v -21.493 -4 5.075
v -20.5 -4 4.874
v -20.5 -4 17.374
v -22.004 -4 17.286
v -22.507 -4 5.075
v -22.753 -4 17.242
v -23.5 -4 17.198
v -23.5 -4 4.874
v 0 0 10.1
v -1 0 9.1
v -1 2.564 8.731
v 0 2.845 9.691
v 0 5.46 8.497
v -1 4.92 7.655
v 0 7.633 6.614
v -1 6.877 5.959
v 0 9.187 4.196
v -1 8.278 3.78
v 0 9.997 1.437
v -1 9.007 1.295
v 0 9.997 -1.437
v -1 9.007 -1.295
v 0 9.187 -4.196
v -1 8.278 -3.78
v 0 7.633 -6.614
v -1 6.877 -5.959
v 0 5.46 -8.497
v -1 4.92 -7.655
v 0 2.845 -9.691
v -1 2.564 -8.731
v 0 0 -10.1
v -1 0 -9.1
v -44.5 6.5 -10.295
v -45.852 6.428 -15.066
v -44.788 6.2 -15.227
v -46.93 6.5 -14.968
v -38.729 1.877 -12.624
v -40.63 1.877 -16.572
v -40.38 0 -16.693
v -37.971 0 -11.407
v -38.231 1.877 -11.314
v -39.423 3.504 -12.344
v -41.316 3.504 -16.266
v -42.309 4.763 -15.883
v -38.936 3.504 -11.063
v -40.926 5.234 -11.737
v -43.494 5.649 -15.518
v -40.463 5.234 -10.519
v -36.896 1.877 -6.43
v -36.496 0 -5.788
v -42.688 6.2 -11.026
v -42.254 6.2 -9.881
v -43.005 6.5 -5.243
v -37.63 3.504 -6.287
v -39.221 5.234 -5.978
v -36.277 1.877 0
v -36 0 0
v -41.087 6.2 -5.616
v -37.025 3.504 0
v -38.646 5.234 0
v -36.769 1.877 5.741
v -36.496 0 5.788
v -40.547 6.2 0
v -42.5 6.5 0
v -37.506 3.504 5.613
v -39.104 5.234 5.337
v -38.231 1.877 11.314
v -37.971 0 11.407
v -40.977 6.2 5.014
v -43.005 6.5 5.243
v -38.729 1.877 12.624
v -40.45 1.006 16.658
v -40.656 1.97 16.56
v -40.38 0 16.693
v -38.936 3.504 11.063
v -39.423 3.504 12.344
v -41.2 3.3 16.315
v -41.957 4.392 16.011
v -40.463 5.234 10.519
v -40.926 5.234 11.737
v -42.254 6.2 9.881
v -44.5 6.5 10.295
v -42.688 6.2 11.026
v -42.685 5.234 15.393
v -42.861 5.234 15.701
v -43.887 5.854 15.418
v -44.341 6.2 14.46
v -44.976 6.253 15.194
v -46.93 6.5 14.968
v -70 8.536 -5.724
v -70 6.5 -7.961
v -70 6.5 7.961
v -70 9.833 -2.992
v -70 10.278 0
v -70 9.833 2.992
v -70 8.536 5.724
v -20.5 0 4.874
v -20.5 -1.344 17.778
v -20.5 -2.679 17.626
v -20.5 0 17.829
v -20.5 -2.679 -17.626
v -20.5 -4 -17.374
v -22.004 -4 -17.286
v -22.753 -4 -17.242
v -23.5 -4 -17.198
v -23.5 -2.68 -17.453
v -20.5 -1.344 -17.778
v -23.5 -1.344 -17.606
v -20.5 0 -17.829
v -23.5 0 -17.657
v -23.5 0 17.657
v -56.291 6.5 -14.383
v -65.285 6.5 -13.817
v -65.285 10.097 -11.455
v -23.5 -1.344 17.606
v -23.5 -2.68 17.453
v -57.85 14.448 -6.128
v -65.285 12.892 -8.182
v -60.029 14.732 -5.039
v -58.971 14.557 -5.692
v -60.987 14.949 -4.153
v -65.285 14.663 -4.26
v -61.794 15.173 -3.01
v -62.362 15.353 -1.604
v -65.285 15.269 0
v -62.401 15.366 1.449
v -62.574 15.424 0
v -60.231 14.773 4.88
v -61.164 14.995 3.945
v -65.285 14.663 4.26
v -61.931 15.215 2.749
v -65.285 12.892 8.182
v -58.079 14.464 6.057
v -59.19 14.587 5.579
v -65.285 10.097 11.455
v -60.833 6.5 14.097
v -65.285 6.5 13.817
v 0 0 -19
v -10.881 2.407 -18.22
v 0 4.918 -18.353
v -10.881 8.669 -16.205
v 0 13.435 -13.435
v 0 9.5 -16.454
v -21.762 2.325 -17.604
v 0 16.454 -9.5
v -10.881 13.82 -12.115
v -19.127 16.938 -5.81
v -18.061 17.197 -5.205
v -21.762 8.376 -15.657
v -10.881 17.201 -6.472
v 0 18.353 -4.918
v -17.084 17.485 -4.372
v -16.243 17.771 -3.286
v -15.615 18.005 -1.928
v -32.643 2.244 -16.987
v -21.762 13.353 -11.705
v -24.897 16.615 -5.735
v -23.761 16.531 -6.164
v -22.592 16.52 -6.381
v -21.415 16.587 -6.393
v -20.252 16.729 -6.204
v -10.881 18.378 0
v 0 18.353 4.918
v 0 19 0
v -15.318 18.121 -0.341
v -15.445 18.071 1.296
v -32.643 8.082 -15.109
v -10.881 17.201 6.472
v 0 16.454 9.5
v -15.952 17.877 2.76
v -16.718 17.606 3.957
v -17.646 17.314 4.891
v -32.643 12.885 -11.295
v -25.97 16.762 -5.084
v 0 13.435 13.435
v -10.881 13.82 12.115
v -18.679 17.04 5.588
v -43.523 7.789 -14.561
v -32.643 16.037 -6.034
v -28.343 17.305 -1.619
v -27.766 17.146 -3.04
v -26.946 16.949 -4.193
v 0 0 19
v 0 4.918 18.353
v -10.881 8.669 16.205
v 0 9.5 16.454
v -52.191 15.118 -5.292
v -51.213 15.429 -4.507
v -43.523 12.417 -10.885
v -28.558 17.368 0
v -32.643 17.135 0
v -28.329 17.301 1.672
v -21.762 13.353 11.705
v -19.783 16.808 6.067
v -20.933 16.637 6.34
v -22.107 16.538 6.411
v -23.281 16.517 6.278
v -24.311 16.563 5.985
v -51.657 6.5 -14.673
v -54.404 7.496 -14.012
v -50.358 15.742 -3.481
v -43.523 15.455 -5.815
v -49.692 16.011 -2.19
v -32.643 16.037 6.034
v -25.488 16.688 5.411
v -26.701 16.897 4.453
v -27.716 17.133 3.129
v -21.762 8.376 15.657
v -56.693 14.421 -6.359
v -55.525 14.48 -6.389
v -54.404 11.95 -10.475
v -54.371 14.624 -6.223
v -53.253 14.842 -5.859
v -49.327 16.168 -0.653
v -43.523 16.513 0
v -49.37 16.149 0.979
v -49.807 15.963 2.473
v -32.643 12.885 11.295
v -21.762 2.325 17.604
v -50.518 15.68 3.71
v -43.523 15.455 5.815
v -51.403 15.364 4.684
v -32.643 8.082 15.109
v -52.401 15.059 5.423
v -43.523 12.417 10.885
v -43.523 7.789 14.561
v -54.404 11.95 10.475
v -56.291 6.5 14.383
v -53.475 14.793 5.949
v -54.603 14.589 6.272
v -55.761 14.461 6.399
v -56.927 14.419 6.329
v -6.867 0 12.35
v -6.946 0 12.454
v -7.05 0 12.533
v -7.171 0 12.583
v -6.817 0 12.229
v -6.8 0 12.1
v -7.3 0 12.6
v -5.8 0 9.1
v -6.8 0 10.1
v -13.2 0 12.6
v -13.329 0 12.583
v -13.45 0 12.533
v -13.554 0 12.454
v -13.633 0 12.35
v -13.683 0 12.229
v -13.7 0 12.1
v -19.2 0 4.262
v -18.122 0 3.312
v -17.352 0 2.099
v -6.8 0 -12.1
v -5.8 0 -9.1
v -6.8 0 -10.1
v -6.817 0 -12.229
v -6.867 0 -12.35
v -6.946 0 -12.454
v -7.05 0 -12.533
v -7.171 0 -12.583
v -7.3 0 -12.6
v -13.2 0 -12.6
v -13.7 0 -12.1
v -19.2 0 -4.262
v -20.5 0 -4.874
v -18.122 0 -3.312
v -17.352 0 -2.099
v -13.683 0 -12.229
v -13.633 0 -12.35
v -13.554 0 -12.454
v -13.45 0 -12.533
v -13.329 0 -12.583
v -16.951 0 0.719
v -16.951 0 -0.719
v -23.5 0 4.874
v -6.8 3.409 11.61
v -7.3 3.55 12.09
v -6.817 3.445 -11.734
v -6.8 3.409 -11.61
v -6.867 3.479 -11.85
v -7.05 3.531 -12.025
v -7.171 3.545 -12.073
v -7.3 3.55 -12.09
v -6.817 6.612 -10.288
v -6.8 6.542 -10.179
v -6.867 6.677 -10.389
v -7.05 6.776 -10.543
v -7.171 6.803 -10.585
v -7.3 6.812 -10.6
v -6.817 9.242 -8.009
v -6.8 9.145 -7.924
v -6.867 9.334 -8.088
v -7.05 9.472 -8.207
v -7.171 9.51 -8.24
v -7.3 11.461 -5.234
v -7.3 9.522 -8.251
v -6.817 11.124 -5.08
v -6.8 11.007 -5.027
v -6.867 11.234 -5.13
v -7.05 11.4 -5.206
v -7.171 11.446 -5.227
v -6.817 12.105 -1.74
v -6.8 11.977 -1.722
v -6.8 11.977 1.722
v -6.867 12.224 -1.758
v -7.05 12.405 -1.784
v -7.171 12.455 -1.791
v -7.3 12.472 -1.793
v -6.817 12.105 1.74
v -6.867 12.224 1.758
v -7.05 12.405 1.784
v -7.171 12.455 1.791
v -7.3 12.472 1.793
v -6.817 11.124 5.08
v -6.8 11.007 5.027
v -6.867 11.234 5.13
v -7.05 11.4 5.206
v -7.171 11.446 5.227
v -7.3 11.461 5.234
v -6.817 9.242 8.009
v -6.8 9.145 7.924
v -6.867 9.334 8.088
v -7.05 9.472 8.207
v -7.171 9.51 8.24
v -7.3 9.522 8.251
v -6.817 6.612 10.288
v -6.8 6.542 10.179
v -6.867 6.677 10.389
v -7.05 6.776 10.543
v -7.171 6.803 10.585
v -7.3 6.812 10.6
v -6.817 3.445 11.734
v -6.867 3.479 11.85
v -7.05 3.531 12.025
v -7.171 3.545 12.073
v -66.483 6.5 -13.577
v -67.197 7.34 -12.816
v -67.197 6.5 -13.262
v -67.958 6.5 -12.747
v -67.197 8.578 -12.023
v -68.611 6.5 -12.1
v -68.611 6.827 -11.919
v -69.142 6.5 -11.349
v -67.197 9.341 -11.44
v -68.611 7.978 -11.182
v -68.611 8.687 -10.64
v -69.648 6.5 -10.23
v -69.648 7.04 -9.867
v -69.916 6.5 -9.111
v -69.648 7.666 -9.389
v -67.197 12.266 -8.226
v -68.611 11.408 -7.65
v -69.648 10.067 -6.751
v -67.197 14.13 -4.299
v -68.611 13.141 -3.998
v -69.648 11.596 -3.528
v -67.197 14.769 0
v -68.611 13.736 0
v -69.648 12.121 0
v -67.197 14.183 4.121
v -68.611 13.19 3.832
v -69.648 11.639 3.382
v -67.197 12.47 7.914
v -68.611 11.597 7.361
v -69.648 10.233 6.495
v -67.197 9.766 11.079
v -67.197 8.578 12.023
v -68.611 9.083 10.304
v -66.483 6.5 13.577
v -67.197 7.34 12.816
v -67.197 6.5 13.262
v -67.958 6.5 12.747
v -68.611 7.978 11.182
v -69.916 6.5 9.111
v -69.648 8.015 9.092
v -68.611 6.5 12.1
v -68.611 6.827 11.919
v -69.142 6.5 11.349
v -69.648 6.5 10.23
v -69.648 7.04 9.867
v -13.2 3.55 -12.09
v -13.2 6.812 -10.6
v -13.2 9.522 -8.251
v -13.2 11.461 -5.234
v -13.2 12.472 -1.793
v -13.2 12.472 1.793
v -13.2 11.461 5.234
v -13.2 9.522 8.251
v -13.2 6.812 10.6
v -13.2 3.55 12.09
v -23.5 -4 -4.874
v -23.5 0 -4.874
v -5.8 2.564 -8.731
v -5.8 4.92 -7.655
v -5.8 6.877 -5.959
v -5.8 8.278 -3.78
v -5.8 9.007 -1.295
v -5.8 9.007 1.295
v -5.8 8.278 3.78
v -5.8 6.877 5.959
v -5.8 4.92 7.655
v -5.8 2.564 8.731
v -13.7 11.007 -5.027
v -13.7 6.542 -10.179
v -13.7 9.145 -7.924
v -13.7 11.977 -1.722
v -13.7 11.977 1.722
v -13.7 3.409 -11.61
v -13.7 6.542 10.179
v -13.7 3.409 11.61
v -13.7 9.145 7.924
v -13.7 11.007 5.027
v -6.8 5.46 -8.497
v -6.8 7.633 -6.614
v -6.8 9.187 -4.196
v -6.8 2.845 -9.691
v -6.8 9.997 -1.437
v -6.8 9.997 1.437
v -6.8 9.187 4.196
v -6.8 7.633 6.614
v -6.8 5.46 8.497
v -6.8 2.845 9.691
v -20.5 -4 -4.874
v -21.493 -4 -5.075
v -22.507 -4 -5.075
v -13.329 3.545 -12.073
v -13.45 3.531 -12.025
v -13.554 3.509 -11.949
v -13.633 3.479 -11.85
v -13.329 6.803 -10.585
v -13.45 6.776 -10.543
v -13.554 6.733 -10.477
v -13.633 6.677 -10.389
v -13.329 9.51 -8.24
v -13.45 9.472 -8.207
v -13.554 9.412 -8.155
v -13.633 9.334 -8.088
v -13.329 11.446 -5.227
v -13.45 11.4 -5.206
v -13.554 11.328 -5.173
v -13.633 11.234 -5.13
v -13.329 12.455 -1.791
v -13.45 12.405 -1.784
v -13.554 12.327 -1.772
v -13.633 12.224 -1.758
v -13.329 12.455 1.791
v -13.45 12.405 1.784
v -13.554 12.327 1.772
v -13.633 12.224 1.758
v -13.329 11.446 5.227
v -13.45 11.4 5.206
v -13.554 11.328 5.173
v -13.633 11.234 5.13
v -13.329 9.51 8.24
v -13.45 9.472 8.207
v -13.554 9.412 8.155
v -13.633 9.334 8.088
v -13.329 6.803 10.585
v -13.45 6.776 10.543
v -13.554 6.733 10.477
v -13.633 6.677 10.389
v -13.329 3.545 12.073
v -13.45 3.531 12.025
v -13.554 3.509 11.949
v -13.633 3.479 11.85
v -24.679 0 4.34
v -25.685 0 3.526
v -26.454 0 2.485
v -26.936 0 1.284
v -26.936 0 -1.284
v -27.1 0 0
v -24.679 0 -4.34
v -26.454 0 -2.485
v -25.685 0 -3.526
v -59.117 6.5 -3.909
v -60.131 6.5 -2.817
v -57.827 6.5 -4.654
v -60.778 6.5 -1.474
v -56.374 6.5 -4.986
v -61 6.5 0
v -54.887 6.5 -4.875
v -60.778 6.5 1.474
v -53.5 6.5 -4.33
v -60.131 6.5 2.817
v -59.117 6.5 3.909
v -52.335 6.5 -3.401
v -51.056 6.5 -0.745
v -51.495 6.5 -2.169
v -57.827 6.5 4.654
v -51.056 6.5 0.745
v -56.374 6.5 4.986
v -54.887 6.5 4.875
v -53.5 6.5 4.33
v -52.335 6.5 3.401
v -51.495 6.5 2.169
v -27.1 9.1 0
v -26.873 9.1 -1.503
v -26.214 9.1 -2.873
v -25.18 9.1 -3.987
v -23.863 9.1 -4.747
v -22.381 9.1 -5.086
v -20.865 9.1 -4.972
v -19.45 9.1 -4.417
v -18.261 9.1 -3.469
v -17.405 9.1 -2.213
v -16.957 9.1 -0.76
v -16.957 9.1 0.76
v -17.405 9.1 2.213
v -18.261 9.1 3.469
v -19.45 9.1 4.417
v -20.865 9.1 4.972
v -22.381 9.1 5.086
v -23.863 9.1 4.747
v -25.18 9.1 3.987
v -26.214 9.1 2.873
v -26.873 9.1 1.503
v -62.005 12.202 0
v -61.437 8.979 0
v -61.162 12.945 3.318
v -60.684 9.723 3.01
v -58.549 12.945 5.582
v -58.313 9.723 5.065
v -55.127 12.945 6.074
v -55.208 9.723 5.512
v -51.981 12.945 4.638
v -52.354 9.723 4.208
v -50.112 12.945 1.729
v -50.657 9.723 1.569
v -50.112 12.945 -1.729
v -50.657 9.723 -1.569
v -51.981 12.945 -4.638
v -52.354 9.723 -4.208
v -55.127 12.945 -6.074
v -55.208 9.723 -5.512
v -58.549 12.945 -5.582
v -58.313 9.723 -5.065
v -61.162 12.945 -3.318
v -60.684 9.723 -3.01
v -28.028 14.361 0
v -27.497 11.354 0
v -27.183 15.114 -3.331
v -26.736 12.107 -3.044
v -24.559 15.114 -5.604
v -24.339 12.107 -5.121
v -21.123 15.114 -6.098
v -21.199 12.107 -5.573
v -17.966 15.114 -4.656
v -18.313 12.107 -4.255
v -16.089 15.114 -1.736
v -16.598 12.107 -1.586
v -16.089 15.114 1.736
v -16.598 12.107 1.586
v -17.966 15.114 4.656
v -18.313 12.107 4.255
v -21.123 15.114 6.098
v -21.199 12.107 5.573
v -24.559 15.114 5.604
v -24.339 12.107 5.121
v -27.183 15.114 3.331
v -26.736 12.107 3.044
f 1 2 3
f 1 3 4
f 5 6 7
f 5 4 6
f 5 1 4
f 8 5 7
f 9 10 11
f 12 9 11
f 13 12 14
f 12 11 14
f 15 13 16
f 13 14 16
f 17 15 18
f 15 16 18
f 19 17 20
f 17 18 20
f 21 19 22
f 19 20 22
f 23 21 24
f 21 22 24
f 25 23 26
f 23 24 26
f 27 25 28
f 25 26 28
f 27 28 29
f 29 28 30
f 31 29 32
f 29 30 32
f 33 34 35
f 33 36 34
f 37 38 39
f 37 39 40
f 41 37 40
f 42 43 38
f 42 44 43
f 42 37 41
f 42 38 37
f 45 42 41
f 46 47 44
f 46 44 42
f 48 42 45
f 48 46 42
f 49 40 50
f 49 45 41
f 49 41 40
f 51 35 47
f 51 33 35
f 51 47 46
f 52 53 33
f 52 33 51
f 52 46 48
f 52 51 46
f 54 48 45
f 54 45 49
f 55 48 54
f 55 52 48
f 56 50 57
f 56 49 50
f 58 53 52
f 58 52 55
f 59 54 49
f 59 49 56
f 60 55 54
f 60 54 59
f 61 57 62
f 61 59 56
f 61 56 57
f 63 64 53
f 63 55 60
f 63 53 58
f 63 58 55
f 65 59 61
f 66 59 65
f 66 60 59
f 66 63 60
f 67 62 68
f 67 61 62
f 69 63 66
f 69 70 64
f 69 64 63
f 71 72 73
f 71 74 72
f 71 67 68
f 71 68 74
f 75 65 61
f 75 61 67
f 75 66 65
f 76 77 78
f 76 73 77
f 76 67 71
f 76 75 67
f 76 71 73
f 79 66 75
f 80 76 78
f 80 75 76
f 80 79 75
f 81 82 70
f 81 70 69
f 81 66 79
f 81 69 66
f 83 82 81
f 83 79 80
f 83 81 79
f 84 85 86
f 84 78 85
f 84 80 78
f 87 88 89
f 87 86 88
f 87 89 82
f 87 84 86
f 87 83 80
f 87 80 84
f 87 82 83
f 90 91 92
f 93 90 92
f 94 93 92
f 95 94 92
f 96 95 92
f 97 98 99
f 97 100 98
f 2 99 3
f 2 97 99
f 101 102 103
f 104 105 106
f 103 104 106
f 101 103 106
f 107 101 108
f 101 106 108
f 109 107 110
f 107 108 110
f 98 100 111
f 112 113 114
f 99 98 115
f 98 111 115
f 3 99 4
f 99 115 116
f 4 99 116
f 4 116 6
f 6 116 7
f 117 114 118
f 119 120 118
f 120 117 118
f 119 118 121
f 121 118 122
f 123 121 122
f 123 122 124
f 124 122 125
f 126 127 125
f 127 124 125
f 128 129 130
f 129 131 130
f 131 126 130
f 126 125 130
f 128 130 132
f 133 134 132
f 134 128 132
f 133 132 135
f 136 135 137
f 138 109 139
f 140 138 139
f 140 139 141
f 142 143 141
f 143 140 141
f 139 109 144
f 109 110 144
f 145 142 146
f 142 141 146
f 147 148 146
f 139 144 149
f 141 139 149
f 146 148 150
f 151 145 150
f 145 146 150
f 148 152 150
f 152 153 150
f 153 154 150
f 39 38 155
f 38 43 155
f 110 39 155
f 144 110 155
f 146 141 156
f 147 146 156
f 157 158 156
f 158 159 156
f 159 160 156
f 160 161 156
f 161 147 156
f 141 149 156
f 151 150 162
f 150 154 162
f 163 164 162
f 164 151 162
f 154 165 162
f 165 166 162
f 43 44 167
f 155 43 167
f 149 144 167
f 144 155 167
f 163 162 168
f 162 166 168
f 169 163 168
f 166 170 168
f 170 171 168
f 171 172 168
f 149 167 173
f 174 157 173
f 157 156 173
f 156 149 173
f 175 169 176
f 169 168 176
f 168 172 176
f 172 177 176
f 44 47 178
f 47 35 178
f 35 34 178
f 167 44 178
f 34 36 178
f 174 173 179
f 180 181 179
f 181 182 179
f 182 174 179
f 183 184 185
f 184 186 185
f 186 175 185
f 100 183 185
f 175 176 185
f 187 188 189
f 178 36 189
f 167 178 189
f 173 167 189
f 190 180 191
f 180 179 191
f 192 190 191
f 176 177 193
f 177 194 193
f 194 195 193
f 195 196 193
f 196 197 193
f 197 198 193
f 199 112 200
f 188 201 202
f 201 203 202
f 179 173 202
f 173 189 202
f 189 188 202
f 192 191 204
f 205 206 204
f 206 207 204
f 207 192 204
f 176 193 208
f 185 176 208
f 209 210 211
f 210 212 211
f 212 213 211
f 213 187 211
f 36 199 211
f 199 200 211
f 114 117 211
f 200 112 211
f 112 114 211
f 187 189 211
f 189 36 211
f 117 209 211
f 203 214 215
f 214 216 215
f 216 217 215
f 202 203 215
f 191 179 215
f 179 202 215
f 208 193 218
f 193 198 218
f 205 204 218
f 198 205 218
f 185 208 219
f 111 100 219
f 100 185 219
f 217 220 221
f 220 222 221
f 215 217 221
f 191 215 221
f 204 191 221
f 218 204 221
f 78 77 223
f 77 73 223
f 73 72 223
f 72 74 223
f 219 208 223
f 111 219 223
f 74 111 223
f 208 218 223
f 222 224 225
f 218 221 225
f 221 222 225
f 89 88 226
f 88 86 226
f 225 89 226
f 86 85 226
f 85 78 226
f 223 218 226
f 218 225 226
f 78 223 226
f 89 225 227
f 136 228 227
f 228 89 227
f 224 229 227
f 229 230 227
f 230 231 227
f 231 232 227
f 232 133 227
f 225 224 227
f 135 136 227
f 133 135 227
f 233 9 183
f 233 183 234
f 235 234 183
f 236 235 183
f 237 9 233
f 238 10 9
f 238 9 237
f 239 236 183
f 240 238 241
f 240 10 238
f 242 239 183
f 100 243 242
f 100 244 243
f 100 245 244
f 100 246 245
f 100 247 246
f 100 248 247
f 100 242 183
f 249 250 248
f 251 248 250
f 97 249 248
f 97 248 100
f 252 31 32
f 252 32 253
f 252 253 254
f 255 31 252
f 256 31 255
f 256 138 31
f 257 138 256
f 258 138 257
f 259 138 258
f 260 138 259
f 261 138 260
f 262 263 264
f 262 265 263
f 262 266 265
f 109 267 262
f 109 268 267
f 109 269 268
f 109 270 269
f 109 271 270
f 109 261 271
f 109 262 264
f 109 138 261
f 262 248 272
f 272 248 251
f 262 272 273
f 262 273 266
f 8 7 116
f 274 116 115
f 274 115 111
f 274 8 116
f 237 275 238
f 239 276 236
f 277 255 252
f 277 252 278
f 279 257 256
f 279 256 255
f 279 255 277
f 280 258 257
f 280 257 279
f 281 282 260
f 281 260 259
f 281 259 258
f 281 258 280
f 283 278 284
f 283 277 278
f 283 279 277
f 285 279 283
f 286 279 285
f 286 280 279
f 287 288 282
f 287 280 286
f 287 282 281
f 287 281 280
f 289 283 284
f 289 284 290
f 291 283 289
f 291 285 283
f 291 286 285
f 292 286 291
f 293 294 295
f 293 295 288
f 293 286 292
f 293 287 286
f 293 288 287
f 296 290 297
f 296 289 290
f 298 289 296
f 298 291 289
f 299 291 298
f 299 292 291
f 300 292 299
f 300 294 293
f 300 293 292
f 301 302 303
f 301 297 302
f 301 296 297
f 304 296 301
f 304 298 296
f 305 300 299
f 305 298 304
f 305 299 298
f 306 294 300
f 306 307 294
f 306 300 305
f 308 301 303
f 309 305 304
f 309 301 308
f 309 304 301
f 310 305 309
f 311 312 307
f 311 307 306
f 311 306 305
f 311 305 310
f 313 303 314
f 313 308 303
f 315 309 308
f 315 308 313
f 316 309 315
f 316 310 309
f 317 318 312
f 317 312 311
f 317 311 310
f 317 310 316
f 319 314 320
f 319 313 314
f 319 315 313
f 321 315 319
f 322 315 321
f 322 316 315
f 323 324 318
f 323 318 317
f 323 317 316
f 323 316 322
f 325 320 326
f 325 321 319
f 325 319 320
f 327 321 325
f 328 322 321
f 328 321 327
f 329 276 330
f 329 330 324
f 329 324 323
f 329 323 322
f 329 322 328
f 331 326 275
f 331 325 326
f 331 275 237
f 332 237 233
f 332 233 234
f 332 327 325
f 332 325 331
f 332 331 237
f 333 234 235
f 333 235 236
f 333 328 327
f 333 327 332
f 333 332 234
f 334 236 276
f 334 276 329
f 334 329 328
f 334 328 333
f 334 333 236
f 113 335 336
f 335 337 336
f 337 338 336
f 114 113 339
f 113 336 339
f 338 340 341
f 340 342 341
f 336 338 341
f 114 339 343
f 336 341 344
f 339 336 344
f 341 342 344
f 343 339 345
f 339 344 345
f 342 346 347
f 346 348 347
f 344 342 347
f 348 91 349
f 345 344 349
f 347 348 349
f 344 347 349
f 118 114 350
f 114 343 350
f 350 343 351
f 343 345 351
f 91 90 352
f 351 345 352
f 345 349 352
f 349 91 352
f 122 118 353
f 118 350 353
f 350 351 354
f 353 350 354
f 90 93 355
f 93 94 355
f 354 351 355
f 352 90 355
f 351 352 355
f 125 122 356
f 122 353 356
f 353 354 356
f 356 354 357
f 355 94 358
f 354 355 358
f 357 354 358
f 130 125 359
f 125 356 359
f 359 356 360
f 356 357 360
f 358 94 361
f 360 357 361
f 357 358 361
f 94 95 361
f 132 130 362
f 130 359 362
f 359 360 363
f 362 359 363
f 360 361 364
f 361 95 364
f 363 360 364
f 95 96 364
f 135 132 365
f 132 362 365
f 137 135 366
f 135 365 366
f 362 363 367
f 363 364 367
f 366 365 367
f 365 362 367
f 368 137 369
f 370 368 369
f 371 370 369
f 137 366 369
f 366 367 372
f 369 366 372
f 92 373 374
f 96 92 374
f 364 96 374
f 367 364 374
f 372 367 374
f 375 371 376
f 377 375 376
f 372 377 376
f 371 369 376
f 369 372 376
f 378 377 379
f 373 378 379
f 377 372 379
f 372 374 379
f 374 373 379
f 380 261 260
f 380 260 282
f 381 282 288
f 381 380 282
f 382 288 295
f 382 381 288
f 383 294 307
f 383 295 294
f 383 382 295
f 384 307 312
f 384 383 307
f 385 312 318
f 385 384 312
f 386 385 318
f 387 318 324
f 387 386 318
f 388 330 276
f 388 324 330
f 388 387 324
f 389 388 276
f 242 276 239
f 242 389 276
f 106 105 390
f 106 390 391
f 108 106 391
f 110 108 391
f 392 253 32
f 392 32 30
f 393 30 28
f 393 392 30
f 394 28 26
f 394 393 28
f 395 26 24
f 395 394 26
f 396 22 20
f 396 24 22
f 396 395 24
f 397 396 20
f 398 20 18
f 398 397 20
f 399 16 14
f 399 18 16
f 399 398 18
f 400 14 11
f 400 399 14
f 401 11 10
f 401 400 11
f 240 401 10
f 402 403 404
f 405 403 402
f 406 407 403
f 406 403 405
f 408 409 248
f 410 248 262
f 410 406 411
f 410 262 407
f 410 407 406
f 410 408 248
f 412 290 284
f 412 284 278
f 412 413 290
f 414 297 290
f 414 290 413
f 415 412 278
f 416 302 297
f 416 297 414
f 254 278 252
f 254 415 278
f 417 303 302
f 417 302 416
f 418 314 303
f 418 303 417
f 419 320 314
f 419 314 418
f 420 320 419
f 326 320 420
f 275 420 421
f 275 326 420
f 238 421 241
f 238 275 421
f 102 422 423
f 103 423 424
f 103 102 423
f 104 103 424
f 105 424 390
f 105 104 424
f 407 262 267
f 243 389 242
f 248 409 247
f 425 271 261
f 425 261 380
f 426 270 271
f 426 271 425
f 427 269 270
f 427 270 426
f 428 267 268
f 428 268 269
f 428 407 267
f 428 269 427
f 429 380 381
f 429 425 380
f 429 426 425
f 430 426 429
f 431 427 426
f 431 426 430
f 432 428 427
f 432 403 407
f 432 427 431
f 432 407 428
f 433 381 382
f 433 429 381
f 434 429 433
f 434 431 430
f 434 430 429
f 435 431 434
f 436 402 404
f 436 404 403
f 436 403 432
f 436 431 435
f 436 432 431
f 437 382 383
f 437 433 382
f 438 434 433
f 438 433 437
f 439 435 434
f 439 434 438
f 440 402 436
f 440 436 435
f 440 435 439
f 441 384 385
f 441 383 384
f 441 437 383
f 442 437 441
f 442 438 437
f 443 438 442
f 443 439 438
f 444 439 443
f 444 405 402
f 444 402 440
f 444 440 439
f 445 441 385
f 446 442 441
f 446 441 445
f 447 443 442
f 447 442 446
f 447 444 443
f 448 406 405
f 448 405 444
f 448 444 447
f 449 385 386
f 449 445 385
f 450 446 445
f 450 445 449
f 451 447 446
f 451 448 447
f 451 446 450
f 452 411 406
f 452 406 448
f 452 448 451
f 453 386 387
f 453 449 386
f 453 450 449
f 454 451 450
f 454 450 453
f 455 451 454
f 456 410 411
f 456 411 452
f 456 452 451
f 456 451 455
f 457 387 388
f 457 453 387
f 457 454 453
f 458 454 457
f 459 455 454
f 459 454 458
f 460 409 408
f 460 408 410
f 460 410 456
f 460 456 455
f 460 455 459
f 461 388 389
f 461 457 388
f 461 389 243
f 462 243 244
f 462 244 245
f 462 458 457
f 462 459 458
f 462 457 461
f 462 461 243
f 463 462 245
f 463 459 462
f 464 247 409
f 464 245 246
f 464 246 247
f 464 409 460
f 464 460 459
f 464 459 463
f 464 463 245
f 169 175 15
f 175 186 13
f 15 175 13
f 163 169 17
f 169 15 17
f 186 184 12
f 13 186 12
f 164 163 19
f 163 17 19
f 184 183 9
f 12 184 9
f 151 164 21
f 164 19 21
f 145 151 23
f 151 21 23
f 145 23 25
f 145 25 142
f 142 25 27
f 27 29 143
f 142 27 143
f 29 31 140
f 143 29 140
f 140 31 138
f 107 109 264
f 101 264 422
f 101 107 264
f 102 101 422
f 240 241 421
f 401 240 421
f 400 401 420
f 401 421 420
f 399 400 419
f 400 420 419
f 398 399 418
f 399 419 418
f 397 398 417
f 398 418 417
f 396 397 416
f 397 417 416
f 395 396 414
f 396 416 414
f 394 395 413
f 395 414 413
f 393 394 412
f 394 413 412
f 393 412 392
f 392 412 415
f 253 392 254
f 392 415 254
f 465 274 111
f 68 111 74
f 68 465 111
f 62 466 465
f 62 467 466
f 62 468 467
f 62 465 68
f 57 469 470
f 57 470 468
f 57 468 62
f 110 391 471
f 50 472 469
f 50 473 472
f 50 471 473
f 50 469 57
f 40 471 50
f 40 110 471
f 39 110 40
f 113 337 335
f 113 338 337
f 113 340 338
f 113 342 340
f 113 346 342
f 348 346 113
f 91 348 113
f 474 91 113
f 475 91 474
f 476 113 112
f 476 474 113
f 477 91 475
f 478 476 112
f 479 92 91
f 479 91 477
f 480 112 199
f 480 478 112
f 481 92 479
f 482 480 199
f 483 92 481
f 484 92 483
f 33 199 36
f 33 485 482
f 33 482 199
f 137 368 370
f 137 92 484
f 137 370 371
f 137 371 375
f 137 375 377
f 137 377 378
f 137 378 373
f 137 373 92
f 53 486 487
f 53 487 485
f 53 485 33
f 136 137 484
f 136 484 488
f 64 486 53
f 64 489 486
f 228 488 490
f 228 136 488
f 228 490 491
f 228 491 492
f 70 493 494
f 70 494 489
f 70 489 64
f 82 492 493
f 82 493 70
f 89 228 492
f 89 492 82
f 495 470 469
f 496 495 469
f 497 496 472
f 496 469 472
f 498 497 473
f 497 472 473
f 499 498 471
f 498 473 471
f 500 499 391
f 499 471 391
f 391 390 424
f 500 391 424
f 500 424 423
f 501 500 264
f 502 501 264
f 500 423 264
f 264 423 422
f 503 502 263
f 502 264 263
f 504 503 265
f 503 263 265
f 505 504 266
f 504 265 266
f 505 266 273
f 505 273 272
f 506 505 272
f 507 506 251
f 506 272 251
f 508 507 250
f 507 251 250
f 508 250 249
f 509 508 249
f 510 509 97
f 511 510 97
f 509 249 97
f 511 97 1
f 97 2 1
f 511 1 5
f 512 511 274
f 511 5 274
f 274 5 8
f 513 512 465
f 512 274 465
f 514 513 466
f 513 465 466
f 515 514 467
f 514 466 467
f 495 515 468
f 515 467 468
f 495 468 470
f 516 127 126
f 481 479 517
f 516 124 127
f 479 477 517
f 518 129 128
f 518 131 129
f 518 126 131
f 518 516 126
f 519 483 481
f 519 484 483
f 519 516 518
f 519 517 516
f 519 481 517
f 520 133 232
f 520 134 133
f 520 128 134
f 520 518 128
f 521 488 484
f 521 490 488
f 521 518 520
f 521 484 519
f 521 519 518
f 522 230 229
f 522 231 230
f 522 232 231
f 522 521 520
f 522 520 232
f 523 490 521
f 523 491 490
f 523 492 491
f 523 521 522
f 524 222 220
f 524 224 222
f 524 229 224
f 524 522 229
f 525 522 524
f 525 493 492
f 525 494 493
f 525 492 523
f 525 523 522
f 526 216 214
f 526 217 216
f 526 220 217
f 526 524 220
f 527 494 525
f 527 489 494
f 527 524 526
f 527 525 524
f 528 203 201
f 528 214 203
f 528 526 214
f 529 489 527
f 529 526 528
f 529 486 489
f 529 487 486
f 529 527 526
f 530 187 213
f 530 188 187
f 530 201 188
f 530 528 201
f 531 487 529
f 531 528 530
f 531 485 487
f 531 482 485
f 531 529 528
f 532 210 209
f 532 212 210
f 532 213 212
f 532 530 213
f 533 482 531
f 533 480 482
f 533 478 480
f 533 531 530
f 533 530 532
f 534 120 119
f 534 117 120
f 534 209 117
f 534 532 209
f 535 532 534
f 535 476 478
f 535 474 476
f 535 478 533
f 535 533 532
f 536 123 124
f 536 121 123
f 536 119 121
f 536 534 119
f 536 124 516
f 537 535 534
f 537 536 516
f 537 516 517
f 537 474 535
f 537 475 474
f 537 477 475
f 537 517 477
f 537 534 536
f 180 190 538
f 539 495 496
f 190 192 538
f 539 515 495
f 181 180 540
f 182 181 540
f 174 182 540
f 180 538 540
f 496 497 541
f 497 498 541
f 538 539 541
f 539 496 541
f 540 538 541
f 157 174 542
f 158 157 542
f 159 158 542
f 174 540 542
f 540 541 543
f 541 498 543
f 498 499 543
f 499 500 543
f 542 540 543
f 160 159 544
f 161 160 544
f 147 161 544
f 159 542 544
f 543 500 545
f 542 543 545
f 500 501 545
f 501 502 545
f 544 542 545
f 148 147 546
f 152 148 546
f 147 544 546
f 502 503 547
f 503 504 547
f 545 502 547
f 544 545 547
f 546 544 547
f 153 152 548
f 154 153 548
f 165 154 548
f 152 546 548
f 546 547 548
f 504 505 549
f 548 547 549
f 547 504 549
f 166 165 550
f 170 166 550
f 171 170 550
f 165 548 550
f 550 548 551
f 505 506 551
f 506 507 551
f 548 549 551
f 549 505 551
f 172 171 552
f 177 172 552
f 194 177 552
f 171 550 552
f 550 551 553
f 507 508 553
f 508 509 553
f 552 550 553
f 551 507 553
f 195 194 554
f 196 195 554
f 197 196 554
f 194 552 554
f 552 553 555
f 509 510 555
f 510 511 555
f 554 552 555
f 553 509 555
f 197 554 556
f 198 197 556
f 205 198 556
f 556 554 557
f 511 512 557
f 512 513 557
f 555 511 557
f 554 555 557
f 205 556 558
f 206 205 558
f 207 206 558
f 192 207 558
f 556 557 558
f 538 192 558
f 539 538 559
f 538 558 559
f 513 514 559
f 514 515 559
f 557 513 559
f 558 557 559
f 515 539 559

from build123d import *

# Parameters (mm, degrees)
F2_R          = 5
F6_DEPTH      = 19.0010001
F6_DEPTH_BACK = 19.0010001
F13_SIZE      = 1


with BuildPart() as f1:
    # F0 (on Front) → F1 (revolve)
    with BuildSketch(Plane.XZ):
        Polygon((0, 0), (0, 19), (-70, 15), (-70, 0), align=None)
    revolve(axis=Axis((-35, 0, 0), (1, 0, 0)))

    # F2
    f2_edges = [f1.edges().sort_by_distance(p)[0] for p in [
        (-70, 0, -15),
    ]]
    fillet(f2_edges, radius=F2_R)

    # F3 (on Top) → F4 (revolve, cut)
    with BuildSketch(Plane.XY):
        with BuildLine():
            Line((-42.5, 6.5), (-70, 6.5))
            Line((-70, 6.5), (-70, -6.5))
            Line((-70, -6.5), (-42.5, -6.5))
            ThreePointArc((-42.5, -6.5), (-36, 0), (-42.5, 6.5))
        make_face()
    revolve(axis=Axis((-70, 10.4297241849, 0), (0, -1, 0)), mode=Mode.SUBTRACT)

    # F5 (on Top) → F6 (cut, two sides)
    with BuildSketch(Plane.XY) as f6_sk:
        Polygon((-23.5, 0), (-70, 0), (-70, -19), (0, -19), (0, 0), (-20.5, 0), (-20.5, -4), (-23.5, -4), align=None)
    extrude(amount=-F6_DEPTH, mode=Mode.SUBTRACT)
    extrude(f6_sk.sketch, amount=F6_DEPTH_BACK, mode=Mode.SUBTRACT)

    # F7 (on Top) → F8 (revolve, cut)
    with BuildSketch(Plane.XY):
        with BuildLine():
            Line((-13.7, 0), (0, 0))
            Line((0, 0), (0, 9.1))
            Line((0, 9.1), (-6.8, 9.1))
            Line((-6.8, 9.1), (-6.8, 12.1))
            ThreePointArc((-6.8, 12.1), (-6.9464466094, 12.4535533906), (-7.3, 12.6))
            Line((-7.3, 12.6), (-13.2, 12.6))
            ThreePointArc((-13.2, 12.6), (-13.5535533906, 12.4535533906), (-13.7, 12.1))
            Line((-13.7, 12.1), (-13.7, 0))
        make_face()
    revolve(axis=Axis((-6.85, 0, 0), (1, 0, 0)), mode=Mode.SUBTRACT)

    # F9 (on Top) → F10 (revolve, cut)
    with BuildSketch(Plane.XY):
        Polygon((-22, 19.2228130501), (-28.8849250614, 19.2228130501), (-27.1, 9.1), (-27.1, -4), (-22, -4), align=None)
    revolve(axis=Axis((-22, 7.6114065251, 0), (0, -1, 0)), mode=Mode.SUBTRACT)

    # F11 (on Top) → F12 (revolve, cut)
    with BuildSketch(Plane.XY):
        Polygon((-56, 6.5), (-56, 21.9801377317), (-63.7295659472, 21.9801377317), (-61, 6.5), align=None)
    revolve(axis=Axis((-56, 14.2400688658, 0), (0, 1, 0)), mode=Mode.SUBTRACT)

    # F13
    f13_edges = [f1.edges().sort_by_distance(p)[0] for p in [
        (-6.8, 9.1, 0),
        (0, 9.1, 0),
    ]]
    chamfer(f13_edges, length=F13_SIZE)


solid = f1.part
